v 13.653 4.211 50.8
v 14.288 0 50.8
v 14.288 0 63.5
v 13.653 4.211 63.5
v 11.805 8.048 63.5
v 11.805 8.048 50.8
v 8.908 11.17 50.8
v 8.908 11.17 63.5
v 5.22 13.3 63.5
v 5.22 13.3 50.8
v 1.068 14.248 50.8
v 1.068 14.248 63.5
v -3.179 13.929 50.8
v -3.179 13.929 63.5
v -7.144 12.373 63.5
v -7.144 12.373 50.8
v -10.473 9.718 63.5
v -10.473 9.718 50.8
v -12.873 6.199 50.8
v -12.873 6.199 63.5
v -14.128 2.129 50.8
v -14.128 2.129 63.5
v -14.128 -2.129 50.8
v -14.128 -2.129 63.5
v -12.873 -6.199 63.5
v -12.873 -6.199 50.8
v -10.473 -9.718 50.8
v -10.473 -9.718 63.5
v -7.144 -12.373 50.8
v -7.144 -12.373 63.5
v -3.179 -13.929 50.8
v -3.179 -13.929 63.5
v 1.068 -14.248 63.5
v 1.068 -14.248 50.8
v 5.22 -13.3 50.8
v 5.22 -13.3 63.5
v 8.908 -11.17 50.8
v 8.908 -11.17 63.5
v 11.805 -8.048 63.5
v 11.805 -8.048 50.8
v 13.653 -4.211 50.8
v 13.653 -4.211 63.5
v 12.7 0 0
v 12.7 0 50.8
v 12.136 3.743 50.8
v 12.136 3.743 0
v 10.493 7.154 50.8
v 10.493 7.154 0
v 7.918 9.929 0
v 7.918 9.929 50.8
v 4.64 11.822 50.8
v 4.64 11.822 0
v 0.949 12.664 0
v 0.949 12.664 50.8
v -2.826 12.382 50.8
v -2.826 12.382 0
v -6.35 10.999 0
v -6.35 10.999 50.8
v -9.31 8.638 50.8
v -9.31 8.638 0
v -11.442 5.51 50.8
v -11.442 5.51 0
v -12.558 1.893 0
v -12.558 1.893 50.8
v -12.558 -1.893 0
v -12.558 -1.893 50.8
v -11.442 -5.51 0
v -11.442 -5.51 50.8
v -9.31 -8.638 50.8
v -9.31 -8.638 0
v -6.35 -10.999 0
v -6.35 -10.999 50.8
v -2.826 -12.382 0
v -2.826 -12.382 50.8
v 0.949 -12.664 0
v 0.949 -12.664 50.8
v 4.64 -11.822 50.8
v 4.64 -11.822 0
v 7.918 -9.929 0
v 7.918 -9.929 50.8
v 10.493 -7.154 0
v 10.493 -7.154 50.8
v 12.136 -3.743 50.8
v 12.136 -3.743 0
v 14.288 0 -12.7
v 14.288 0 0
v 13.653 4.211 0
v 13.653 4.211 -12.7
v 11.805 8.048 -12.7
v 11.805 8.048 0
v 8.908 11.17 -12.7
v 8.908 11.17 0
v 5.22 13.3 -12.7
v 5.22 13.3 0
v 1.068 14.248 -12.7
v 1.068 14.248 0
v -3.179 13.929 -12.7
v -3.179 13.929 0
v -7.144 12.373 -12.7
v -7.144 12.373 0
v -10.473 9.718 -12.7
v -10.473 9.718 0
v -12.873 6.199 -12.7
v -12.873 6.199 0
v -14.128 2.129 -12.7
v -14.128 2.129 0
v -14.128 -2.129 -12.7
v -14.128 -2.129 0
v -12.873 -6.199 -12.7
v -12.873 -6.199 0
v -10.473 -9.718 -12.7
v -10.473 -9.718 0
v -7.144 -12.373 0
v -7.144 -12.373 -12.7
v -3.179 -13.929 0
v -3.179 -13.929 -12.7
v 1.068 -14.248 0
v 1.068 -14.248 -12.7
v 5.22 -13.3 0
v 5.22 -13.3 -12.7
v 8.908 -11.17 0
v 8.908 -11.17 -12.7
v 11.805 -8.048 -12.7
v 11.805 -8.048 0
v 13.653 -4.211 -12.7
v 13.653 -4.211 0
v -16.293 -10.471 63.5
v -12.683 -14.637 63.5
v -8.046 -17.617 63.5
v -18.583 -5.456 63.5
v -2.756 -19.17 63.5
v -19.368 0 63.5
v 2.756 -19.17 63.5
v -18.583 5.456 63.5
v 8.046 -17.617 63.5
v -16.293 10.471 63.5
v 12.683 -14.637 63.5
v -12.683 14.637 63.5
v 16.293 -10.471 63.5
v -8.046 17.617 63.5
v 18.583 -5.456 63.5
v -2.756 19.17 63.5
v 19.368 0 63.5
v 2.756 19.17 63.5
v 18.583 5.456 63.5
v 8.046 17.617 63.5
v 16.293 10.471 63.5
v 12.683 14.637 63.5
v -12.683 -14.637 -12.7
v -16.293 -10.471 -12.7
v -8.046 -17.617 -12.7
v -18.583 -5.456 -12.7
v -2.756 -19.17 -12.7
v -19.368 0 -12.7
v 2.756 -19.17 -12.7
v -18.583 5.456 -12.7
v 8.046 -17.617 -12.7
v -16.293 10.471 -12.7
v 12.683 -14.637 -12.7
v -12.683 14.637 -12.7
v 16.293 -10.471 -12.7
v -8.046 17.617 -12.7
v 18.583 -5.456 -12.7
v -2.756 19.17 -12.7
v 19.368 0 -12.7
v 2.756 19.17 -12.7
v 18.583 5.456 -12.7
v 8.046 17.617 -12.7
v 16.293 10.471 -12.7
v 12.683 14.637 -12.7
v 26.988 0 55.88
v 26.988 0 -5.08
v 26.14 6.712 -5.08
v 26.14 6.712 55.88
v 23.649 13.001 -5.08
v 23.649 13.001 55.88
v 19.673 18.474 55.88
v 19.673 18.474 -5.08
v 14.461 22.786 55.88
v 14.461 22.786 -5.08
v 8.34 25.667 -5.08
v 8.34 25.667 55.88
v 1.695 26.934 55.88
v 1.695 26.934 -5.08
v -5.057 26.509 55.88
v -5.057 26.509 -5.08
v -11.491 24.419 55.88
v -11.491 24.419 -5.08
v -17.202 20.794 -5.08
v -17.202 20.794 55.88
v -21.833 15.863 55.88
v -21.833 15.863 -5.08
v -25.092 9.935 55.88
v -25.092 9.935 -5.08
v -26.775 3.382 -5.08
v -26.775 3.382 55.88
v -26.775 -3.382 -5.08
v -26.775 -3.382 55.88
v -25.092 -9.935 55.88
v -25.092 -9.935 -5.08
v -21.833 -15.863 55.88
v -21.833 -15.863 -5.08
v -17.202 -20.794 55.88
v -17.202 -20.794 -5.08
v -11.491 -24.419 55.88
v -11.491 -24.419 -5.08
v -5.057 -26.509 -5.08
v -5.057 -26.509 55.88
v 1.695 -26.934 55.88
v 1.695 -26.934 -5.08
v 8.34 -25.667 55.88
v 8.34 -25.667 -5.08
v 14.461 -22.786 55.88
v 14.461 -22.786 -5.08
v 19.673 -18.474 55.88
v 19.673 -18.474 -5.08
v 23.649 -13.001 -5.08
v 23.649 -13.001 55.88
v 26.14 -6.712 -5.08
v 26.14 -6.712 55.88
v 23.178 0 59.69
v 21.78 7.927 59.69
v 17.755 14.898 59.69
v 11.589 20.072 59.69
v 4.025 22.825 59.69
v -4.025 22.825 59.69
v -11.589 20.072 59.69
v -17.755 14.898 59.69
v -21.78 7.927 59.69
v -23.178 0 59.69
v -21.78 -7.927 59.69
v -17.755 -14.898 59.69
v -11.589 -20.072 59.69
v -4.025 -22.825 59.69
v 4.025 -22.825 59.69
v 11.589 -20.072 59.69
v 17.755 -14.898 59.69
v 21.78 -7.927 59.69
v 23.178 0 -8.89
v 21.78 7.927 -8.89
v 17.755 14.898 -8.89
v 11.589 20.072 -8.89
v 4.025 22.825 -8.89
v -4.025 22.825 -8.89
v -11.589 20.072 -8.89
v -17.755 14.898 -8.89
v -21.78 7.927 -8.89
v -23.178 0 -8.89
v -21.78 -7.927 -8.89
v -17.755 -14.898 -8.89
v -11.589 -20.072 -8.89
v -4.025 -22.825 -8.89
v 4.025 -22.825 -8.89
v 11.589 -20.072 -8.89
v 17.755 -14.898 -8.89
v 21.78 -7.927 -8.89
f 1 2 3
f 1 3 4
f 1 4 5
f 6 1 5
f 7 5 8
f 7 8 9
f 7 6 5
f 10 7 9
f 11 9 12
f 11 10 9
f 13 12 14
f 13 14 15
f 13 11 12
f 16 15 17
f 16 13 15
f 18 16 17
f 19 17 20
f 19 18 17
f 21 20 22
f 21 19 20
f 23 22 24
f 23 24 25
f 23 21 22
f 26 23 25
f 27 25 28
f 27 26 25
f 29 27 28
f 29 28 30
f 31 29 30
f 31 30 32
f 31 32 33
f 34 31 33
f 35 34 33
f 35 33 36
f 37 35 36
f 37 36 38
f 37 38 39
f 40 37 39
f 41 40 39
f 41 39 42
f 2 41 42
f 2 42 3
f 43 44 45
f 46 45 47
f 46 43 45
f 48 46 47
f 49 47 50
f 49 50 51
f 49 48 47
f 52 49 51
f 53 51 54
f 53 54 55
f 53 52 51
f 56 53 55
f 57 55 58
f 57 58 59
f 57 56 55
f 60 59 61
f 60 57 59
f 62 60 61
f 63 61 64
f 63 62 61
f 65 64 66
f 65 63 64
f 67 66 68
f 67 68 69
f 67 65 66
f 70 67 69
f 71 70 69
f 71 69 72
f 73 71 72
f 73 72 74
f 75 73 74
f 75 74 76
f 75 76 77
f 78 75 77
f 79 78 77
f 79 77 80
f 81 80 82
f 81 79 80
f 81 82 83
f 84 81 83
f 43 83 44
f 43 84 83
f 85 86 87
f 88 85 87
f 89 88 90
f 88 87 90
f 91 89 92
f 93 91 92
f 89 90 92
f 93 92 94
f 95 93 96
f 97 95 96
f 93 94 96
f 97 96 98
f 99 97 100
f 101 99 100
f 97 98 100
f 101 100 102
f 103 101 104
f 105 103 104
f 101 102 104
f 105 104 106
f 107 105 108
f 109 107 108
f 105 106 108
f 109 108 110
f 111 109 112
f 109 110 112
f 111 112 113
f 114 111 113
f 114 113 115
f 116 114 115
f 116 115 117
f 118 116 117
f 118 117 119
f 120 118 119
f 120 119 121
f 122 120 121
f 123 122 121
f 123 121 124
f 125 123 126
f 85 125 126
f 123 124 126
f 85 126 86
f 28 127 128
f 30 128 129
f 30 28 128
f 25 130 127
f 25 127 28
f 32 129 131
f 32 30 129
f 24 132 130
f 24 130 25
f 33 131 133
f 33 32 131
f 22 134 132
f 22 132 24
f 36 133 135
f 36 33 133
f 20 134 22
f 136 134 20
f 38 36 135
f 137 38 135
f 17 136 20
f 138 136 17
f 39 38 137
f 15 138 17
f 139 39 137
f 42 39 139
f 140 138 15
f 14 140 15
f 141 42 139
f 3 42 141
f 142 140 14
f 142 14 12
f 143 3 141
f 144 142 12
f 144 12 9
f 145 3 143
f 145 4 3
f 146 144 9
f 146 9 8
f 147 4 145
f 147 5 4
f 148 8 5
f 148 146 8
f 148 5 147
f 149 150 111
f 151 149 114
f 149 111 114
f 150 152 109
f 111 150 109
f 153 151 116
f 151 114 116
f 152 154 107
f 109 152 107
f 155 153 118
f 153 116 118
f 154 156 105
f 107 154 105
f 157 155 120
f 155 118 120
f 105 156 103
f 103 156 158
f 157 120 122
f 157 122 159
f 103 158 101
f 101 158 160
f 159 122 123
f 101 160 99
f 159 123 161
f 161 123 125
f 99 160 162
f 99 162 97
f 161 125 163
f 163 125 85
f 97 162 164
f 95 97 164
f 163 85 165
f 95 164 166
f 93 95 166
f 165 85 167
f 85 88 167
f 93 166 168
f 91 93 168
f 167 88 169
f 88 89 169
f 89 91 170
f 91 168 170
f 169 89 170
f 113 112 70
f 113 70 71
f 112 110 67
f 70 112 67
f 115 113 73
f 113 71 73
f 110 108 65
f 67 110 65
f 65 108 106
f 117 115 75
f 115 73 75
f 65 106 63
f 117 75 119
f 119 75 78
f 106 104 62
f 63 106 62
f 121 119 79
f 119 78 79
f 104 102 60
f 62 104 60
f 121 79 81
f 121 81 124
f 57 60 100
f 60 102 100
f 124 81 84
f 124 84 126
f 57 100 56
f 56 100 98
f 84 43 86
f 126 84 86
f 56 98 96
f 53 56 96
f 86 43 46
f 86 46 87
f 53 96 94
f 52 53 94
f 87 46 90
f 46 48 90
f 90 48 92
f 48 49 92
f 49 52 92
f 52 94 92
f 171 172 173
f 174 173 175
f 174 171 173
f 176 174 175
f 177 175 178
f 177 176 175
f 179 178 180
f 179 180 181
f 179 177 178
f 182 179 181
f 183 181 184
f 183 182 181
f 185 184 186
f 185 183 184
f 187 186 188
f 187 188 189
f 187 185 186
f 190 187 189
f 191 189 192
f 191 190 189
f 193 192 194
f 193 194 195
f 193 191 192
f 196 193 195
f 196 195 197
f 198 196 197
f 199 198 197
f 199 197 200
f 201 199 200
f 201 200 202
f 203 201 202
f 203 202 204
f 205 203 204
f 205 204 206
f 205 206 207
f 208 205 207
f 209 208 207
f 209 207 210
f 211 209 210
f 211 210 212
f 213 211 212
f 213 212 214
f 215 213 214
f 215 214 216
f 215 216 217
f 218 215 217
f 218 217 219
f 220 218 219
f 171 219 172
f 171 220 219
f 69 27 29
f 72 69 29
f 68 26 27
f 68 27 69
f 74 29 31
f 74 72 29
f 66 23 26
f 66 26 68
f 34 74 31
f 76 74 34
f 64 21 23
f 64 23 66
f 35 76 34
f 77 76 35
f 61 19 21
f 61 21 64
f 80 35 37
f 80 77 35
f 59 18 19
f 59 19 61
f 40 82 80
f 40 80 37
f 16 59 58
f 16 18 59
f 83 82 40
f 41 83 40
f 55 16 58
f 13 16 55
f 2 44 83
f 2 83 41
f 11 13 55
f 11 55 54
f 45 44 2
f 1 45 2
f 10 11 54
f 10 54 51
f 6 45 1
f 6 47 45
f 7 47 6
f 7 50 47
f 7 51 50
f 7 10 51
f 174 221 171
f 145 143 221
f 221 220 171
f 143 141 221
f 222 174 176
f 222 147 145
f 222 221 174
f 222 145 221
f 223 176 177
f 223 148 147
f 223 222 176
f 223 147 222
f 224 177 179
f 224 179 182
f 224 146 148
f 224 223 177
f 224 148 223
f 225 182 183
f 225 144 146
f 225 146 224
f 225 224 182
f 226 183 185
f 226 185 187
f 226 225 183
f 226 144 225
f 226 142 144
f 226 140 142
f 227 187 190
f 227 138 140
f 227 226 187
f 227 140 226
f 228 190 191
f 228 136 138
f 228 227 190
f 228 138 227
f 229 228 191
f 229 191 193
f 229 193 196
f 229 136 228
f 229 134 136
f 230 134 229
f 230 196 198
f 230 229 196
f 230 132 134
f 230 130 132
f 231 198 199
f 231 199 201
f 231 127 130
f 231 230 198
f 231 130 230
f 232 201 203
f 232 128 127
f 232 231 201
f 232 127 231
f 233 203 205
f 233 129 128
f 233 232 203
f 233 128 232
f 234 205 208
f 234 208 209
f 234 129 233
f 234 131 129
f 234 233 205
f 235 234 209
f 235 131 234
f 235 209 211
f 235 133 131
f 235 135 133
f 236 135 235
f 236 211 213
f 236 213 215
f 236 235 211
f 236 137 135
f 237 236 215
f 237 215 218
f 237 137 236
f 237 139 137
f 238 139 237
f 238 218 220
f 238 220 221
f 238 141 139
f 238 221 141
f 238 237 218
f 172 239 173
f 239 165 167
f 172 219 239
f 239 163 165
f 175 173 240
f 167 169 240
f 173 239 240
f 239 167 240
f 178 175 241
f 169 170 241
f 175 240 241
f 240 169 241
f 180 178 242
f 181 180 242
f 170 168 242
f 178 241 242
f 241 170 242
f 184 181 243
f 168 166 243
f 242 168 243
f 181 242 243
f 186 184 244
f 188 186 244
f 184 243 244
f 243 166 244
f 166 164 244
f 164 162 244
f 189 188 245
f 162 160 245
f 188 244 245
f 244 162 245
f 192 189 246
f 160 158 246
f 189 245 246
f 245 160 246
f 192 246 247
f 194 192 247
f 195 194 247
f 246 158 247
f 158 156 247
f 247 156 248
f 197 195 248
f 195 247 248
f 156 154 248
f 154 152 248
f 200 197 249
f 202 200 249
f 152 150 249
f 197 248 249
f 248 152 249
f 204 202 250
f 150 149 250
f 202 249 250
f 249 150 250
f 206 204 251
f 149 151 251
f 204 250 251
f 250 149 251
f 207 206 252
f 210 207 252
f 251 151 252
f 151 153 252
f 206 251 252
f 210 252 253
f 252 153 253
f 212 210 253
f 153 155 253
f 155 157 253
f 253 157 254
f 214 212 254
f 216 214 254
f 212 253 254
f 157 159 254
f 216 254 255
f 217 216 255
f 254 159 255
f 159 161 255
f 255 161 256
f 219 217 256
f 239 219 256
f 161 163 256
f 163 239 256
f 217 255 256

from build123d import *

# Parameters (mm, degrees)
F0_R          = 14.2875
F0_R_2        = 12.7
F2_DEPTH      = 50.8
F3_R          = 26.9875
F3_R_2        = 14.2875
F4_DEPTH      = 63.5
F4_DEPTH_BACK = 12.7
F5_SIZE       = 7.62


with BuildPart() as f2:
    # F0 (on Top) → F2 (new body)
    with BuildSketch(Plane.XY):
        Circle(F0_R)
        Circle(F0_R_2, mode=Mode.SUBTRACT)
    extrude(amount=F2_DEPTH)

    # F3 (on face) → F4 (join, two sides)
    with BuildSketch(Plane.XY) as f4_sk:
        Circle(F3_R)
        Circle(F3_R_2, mode=Mode.SUBTRACT)
    extrude(amount=F4_DEPTH)
    extrude(f4_sk.sketch, amount=-F4_DEPTH_BACK)

    # F5
    f5_edges = [f2.edges().sort_by_distance(p)[0] for p in [
        (-26.9875, 0, 63.5),
        (-26.9875, 0, -12.7),
    ]]
    chamfer(f5_edges, length=F5_SIZE)


solid = f2.part
